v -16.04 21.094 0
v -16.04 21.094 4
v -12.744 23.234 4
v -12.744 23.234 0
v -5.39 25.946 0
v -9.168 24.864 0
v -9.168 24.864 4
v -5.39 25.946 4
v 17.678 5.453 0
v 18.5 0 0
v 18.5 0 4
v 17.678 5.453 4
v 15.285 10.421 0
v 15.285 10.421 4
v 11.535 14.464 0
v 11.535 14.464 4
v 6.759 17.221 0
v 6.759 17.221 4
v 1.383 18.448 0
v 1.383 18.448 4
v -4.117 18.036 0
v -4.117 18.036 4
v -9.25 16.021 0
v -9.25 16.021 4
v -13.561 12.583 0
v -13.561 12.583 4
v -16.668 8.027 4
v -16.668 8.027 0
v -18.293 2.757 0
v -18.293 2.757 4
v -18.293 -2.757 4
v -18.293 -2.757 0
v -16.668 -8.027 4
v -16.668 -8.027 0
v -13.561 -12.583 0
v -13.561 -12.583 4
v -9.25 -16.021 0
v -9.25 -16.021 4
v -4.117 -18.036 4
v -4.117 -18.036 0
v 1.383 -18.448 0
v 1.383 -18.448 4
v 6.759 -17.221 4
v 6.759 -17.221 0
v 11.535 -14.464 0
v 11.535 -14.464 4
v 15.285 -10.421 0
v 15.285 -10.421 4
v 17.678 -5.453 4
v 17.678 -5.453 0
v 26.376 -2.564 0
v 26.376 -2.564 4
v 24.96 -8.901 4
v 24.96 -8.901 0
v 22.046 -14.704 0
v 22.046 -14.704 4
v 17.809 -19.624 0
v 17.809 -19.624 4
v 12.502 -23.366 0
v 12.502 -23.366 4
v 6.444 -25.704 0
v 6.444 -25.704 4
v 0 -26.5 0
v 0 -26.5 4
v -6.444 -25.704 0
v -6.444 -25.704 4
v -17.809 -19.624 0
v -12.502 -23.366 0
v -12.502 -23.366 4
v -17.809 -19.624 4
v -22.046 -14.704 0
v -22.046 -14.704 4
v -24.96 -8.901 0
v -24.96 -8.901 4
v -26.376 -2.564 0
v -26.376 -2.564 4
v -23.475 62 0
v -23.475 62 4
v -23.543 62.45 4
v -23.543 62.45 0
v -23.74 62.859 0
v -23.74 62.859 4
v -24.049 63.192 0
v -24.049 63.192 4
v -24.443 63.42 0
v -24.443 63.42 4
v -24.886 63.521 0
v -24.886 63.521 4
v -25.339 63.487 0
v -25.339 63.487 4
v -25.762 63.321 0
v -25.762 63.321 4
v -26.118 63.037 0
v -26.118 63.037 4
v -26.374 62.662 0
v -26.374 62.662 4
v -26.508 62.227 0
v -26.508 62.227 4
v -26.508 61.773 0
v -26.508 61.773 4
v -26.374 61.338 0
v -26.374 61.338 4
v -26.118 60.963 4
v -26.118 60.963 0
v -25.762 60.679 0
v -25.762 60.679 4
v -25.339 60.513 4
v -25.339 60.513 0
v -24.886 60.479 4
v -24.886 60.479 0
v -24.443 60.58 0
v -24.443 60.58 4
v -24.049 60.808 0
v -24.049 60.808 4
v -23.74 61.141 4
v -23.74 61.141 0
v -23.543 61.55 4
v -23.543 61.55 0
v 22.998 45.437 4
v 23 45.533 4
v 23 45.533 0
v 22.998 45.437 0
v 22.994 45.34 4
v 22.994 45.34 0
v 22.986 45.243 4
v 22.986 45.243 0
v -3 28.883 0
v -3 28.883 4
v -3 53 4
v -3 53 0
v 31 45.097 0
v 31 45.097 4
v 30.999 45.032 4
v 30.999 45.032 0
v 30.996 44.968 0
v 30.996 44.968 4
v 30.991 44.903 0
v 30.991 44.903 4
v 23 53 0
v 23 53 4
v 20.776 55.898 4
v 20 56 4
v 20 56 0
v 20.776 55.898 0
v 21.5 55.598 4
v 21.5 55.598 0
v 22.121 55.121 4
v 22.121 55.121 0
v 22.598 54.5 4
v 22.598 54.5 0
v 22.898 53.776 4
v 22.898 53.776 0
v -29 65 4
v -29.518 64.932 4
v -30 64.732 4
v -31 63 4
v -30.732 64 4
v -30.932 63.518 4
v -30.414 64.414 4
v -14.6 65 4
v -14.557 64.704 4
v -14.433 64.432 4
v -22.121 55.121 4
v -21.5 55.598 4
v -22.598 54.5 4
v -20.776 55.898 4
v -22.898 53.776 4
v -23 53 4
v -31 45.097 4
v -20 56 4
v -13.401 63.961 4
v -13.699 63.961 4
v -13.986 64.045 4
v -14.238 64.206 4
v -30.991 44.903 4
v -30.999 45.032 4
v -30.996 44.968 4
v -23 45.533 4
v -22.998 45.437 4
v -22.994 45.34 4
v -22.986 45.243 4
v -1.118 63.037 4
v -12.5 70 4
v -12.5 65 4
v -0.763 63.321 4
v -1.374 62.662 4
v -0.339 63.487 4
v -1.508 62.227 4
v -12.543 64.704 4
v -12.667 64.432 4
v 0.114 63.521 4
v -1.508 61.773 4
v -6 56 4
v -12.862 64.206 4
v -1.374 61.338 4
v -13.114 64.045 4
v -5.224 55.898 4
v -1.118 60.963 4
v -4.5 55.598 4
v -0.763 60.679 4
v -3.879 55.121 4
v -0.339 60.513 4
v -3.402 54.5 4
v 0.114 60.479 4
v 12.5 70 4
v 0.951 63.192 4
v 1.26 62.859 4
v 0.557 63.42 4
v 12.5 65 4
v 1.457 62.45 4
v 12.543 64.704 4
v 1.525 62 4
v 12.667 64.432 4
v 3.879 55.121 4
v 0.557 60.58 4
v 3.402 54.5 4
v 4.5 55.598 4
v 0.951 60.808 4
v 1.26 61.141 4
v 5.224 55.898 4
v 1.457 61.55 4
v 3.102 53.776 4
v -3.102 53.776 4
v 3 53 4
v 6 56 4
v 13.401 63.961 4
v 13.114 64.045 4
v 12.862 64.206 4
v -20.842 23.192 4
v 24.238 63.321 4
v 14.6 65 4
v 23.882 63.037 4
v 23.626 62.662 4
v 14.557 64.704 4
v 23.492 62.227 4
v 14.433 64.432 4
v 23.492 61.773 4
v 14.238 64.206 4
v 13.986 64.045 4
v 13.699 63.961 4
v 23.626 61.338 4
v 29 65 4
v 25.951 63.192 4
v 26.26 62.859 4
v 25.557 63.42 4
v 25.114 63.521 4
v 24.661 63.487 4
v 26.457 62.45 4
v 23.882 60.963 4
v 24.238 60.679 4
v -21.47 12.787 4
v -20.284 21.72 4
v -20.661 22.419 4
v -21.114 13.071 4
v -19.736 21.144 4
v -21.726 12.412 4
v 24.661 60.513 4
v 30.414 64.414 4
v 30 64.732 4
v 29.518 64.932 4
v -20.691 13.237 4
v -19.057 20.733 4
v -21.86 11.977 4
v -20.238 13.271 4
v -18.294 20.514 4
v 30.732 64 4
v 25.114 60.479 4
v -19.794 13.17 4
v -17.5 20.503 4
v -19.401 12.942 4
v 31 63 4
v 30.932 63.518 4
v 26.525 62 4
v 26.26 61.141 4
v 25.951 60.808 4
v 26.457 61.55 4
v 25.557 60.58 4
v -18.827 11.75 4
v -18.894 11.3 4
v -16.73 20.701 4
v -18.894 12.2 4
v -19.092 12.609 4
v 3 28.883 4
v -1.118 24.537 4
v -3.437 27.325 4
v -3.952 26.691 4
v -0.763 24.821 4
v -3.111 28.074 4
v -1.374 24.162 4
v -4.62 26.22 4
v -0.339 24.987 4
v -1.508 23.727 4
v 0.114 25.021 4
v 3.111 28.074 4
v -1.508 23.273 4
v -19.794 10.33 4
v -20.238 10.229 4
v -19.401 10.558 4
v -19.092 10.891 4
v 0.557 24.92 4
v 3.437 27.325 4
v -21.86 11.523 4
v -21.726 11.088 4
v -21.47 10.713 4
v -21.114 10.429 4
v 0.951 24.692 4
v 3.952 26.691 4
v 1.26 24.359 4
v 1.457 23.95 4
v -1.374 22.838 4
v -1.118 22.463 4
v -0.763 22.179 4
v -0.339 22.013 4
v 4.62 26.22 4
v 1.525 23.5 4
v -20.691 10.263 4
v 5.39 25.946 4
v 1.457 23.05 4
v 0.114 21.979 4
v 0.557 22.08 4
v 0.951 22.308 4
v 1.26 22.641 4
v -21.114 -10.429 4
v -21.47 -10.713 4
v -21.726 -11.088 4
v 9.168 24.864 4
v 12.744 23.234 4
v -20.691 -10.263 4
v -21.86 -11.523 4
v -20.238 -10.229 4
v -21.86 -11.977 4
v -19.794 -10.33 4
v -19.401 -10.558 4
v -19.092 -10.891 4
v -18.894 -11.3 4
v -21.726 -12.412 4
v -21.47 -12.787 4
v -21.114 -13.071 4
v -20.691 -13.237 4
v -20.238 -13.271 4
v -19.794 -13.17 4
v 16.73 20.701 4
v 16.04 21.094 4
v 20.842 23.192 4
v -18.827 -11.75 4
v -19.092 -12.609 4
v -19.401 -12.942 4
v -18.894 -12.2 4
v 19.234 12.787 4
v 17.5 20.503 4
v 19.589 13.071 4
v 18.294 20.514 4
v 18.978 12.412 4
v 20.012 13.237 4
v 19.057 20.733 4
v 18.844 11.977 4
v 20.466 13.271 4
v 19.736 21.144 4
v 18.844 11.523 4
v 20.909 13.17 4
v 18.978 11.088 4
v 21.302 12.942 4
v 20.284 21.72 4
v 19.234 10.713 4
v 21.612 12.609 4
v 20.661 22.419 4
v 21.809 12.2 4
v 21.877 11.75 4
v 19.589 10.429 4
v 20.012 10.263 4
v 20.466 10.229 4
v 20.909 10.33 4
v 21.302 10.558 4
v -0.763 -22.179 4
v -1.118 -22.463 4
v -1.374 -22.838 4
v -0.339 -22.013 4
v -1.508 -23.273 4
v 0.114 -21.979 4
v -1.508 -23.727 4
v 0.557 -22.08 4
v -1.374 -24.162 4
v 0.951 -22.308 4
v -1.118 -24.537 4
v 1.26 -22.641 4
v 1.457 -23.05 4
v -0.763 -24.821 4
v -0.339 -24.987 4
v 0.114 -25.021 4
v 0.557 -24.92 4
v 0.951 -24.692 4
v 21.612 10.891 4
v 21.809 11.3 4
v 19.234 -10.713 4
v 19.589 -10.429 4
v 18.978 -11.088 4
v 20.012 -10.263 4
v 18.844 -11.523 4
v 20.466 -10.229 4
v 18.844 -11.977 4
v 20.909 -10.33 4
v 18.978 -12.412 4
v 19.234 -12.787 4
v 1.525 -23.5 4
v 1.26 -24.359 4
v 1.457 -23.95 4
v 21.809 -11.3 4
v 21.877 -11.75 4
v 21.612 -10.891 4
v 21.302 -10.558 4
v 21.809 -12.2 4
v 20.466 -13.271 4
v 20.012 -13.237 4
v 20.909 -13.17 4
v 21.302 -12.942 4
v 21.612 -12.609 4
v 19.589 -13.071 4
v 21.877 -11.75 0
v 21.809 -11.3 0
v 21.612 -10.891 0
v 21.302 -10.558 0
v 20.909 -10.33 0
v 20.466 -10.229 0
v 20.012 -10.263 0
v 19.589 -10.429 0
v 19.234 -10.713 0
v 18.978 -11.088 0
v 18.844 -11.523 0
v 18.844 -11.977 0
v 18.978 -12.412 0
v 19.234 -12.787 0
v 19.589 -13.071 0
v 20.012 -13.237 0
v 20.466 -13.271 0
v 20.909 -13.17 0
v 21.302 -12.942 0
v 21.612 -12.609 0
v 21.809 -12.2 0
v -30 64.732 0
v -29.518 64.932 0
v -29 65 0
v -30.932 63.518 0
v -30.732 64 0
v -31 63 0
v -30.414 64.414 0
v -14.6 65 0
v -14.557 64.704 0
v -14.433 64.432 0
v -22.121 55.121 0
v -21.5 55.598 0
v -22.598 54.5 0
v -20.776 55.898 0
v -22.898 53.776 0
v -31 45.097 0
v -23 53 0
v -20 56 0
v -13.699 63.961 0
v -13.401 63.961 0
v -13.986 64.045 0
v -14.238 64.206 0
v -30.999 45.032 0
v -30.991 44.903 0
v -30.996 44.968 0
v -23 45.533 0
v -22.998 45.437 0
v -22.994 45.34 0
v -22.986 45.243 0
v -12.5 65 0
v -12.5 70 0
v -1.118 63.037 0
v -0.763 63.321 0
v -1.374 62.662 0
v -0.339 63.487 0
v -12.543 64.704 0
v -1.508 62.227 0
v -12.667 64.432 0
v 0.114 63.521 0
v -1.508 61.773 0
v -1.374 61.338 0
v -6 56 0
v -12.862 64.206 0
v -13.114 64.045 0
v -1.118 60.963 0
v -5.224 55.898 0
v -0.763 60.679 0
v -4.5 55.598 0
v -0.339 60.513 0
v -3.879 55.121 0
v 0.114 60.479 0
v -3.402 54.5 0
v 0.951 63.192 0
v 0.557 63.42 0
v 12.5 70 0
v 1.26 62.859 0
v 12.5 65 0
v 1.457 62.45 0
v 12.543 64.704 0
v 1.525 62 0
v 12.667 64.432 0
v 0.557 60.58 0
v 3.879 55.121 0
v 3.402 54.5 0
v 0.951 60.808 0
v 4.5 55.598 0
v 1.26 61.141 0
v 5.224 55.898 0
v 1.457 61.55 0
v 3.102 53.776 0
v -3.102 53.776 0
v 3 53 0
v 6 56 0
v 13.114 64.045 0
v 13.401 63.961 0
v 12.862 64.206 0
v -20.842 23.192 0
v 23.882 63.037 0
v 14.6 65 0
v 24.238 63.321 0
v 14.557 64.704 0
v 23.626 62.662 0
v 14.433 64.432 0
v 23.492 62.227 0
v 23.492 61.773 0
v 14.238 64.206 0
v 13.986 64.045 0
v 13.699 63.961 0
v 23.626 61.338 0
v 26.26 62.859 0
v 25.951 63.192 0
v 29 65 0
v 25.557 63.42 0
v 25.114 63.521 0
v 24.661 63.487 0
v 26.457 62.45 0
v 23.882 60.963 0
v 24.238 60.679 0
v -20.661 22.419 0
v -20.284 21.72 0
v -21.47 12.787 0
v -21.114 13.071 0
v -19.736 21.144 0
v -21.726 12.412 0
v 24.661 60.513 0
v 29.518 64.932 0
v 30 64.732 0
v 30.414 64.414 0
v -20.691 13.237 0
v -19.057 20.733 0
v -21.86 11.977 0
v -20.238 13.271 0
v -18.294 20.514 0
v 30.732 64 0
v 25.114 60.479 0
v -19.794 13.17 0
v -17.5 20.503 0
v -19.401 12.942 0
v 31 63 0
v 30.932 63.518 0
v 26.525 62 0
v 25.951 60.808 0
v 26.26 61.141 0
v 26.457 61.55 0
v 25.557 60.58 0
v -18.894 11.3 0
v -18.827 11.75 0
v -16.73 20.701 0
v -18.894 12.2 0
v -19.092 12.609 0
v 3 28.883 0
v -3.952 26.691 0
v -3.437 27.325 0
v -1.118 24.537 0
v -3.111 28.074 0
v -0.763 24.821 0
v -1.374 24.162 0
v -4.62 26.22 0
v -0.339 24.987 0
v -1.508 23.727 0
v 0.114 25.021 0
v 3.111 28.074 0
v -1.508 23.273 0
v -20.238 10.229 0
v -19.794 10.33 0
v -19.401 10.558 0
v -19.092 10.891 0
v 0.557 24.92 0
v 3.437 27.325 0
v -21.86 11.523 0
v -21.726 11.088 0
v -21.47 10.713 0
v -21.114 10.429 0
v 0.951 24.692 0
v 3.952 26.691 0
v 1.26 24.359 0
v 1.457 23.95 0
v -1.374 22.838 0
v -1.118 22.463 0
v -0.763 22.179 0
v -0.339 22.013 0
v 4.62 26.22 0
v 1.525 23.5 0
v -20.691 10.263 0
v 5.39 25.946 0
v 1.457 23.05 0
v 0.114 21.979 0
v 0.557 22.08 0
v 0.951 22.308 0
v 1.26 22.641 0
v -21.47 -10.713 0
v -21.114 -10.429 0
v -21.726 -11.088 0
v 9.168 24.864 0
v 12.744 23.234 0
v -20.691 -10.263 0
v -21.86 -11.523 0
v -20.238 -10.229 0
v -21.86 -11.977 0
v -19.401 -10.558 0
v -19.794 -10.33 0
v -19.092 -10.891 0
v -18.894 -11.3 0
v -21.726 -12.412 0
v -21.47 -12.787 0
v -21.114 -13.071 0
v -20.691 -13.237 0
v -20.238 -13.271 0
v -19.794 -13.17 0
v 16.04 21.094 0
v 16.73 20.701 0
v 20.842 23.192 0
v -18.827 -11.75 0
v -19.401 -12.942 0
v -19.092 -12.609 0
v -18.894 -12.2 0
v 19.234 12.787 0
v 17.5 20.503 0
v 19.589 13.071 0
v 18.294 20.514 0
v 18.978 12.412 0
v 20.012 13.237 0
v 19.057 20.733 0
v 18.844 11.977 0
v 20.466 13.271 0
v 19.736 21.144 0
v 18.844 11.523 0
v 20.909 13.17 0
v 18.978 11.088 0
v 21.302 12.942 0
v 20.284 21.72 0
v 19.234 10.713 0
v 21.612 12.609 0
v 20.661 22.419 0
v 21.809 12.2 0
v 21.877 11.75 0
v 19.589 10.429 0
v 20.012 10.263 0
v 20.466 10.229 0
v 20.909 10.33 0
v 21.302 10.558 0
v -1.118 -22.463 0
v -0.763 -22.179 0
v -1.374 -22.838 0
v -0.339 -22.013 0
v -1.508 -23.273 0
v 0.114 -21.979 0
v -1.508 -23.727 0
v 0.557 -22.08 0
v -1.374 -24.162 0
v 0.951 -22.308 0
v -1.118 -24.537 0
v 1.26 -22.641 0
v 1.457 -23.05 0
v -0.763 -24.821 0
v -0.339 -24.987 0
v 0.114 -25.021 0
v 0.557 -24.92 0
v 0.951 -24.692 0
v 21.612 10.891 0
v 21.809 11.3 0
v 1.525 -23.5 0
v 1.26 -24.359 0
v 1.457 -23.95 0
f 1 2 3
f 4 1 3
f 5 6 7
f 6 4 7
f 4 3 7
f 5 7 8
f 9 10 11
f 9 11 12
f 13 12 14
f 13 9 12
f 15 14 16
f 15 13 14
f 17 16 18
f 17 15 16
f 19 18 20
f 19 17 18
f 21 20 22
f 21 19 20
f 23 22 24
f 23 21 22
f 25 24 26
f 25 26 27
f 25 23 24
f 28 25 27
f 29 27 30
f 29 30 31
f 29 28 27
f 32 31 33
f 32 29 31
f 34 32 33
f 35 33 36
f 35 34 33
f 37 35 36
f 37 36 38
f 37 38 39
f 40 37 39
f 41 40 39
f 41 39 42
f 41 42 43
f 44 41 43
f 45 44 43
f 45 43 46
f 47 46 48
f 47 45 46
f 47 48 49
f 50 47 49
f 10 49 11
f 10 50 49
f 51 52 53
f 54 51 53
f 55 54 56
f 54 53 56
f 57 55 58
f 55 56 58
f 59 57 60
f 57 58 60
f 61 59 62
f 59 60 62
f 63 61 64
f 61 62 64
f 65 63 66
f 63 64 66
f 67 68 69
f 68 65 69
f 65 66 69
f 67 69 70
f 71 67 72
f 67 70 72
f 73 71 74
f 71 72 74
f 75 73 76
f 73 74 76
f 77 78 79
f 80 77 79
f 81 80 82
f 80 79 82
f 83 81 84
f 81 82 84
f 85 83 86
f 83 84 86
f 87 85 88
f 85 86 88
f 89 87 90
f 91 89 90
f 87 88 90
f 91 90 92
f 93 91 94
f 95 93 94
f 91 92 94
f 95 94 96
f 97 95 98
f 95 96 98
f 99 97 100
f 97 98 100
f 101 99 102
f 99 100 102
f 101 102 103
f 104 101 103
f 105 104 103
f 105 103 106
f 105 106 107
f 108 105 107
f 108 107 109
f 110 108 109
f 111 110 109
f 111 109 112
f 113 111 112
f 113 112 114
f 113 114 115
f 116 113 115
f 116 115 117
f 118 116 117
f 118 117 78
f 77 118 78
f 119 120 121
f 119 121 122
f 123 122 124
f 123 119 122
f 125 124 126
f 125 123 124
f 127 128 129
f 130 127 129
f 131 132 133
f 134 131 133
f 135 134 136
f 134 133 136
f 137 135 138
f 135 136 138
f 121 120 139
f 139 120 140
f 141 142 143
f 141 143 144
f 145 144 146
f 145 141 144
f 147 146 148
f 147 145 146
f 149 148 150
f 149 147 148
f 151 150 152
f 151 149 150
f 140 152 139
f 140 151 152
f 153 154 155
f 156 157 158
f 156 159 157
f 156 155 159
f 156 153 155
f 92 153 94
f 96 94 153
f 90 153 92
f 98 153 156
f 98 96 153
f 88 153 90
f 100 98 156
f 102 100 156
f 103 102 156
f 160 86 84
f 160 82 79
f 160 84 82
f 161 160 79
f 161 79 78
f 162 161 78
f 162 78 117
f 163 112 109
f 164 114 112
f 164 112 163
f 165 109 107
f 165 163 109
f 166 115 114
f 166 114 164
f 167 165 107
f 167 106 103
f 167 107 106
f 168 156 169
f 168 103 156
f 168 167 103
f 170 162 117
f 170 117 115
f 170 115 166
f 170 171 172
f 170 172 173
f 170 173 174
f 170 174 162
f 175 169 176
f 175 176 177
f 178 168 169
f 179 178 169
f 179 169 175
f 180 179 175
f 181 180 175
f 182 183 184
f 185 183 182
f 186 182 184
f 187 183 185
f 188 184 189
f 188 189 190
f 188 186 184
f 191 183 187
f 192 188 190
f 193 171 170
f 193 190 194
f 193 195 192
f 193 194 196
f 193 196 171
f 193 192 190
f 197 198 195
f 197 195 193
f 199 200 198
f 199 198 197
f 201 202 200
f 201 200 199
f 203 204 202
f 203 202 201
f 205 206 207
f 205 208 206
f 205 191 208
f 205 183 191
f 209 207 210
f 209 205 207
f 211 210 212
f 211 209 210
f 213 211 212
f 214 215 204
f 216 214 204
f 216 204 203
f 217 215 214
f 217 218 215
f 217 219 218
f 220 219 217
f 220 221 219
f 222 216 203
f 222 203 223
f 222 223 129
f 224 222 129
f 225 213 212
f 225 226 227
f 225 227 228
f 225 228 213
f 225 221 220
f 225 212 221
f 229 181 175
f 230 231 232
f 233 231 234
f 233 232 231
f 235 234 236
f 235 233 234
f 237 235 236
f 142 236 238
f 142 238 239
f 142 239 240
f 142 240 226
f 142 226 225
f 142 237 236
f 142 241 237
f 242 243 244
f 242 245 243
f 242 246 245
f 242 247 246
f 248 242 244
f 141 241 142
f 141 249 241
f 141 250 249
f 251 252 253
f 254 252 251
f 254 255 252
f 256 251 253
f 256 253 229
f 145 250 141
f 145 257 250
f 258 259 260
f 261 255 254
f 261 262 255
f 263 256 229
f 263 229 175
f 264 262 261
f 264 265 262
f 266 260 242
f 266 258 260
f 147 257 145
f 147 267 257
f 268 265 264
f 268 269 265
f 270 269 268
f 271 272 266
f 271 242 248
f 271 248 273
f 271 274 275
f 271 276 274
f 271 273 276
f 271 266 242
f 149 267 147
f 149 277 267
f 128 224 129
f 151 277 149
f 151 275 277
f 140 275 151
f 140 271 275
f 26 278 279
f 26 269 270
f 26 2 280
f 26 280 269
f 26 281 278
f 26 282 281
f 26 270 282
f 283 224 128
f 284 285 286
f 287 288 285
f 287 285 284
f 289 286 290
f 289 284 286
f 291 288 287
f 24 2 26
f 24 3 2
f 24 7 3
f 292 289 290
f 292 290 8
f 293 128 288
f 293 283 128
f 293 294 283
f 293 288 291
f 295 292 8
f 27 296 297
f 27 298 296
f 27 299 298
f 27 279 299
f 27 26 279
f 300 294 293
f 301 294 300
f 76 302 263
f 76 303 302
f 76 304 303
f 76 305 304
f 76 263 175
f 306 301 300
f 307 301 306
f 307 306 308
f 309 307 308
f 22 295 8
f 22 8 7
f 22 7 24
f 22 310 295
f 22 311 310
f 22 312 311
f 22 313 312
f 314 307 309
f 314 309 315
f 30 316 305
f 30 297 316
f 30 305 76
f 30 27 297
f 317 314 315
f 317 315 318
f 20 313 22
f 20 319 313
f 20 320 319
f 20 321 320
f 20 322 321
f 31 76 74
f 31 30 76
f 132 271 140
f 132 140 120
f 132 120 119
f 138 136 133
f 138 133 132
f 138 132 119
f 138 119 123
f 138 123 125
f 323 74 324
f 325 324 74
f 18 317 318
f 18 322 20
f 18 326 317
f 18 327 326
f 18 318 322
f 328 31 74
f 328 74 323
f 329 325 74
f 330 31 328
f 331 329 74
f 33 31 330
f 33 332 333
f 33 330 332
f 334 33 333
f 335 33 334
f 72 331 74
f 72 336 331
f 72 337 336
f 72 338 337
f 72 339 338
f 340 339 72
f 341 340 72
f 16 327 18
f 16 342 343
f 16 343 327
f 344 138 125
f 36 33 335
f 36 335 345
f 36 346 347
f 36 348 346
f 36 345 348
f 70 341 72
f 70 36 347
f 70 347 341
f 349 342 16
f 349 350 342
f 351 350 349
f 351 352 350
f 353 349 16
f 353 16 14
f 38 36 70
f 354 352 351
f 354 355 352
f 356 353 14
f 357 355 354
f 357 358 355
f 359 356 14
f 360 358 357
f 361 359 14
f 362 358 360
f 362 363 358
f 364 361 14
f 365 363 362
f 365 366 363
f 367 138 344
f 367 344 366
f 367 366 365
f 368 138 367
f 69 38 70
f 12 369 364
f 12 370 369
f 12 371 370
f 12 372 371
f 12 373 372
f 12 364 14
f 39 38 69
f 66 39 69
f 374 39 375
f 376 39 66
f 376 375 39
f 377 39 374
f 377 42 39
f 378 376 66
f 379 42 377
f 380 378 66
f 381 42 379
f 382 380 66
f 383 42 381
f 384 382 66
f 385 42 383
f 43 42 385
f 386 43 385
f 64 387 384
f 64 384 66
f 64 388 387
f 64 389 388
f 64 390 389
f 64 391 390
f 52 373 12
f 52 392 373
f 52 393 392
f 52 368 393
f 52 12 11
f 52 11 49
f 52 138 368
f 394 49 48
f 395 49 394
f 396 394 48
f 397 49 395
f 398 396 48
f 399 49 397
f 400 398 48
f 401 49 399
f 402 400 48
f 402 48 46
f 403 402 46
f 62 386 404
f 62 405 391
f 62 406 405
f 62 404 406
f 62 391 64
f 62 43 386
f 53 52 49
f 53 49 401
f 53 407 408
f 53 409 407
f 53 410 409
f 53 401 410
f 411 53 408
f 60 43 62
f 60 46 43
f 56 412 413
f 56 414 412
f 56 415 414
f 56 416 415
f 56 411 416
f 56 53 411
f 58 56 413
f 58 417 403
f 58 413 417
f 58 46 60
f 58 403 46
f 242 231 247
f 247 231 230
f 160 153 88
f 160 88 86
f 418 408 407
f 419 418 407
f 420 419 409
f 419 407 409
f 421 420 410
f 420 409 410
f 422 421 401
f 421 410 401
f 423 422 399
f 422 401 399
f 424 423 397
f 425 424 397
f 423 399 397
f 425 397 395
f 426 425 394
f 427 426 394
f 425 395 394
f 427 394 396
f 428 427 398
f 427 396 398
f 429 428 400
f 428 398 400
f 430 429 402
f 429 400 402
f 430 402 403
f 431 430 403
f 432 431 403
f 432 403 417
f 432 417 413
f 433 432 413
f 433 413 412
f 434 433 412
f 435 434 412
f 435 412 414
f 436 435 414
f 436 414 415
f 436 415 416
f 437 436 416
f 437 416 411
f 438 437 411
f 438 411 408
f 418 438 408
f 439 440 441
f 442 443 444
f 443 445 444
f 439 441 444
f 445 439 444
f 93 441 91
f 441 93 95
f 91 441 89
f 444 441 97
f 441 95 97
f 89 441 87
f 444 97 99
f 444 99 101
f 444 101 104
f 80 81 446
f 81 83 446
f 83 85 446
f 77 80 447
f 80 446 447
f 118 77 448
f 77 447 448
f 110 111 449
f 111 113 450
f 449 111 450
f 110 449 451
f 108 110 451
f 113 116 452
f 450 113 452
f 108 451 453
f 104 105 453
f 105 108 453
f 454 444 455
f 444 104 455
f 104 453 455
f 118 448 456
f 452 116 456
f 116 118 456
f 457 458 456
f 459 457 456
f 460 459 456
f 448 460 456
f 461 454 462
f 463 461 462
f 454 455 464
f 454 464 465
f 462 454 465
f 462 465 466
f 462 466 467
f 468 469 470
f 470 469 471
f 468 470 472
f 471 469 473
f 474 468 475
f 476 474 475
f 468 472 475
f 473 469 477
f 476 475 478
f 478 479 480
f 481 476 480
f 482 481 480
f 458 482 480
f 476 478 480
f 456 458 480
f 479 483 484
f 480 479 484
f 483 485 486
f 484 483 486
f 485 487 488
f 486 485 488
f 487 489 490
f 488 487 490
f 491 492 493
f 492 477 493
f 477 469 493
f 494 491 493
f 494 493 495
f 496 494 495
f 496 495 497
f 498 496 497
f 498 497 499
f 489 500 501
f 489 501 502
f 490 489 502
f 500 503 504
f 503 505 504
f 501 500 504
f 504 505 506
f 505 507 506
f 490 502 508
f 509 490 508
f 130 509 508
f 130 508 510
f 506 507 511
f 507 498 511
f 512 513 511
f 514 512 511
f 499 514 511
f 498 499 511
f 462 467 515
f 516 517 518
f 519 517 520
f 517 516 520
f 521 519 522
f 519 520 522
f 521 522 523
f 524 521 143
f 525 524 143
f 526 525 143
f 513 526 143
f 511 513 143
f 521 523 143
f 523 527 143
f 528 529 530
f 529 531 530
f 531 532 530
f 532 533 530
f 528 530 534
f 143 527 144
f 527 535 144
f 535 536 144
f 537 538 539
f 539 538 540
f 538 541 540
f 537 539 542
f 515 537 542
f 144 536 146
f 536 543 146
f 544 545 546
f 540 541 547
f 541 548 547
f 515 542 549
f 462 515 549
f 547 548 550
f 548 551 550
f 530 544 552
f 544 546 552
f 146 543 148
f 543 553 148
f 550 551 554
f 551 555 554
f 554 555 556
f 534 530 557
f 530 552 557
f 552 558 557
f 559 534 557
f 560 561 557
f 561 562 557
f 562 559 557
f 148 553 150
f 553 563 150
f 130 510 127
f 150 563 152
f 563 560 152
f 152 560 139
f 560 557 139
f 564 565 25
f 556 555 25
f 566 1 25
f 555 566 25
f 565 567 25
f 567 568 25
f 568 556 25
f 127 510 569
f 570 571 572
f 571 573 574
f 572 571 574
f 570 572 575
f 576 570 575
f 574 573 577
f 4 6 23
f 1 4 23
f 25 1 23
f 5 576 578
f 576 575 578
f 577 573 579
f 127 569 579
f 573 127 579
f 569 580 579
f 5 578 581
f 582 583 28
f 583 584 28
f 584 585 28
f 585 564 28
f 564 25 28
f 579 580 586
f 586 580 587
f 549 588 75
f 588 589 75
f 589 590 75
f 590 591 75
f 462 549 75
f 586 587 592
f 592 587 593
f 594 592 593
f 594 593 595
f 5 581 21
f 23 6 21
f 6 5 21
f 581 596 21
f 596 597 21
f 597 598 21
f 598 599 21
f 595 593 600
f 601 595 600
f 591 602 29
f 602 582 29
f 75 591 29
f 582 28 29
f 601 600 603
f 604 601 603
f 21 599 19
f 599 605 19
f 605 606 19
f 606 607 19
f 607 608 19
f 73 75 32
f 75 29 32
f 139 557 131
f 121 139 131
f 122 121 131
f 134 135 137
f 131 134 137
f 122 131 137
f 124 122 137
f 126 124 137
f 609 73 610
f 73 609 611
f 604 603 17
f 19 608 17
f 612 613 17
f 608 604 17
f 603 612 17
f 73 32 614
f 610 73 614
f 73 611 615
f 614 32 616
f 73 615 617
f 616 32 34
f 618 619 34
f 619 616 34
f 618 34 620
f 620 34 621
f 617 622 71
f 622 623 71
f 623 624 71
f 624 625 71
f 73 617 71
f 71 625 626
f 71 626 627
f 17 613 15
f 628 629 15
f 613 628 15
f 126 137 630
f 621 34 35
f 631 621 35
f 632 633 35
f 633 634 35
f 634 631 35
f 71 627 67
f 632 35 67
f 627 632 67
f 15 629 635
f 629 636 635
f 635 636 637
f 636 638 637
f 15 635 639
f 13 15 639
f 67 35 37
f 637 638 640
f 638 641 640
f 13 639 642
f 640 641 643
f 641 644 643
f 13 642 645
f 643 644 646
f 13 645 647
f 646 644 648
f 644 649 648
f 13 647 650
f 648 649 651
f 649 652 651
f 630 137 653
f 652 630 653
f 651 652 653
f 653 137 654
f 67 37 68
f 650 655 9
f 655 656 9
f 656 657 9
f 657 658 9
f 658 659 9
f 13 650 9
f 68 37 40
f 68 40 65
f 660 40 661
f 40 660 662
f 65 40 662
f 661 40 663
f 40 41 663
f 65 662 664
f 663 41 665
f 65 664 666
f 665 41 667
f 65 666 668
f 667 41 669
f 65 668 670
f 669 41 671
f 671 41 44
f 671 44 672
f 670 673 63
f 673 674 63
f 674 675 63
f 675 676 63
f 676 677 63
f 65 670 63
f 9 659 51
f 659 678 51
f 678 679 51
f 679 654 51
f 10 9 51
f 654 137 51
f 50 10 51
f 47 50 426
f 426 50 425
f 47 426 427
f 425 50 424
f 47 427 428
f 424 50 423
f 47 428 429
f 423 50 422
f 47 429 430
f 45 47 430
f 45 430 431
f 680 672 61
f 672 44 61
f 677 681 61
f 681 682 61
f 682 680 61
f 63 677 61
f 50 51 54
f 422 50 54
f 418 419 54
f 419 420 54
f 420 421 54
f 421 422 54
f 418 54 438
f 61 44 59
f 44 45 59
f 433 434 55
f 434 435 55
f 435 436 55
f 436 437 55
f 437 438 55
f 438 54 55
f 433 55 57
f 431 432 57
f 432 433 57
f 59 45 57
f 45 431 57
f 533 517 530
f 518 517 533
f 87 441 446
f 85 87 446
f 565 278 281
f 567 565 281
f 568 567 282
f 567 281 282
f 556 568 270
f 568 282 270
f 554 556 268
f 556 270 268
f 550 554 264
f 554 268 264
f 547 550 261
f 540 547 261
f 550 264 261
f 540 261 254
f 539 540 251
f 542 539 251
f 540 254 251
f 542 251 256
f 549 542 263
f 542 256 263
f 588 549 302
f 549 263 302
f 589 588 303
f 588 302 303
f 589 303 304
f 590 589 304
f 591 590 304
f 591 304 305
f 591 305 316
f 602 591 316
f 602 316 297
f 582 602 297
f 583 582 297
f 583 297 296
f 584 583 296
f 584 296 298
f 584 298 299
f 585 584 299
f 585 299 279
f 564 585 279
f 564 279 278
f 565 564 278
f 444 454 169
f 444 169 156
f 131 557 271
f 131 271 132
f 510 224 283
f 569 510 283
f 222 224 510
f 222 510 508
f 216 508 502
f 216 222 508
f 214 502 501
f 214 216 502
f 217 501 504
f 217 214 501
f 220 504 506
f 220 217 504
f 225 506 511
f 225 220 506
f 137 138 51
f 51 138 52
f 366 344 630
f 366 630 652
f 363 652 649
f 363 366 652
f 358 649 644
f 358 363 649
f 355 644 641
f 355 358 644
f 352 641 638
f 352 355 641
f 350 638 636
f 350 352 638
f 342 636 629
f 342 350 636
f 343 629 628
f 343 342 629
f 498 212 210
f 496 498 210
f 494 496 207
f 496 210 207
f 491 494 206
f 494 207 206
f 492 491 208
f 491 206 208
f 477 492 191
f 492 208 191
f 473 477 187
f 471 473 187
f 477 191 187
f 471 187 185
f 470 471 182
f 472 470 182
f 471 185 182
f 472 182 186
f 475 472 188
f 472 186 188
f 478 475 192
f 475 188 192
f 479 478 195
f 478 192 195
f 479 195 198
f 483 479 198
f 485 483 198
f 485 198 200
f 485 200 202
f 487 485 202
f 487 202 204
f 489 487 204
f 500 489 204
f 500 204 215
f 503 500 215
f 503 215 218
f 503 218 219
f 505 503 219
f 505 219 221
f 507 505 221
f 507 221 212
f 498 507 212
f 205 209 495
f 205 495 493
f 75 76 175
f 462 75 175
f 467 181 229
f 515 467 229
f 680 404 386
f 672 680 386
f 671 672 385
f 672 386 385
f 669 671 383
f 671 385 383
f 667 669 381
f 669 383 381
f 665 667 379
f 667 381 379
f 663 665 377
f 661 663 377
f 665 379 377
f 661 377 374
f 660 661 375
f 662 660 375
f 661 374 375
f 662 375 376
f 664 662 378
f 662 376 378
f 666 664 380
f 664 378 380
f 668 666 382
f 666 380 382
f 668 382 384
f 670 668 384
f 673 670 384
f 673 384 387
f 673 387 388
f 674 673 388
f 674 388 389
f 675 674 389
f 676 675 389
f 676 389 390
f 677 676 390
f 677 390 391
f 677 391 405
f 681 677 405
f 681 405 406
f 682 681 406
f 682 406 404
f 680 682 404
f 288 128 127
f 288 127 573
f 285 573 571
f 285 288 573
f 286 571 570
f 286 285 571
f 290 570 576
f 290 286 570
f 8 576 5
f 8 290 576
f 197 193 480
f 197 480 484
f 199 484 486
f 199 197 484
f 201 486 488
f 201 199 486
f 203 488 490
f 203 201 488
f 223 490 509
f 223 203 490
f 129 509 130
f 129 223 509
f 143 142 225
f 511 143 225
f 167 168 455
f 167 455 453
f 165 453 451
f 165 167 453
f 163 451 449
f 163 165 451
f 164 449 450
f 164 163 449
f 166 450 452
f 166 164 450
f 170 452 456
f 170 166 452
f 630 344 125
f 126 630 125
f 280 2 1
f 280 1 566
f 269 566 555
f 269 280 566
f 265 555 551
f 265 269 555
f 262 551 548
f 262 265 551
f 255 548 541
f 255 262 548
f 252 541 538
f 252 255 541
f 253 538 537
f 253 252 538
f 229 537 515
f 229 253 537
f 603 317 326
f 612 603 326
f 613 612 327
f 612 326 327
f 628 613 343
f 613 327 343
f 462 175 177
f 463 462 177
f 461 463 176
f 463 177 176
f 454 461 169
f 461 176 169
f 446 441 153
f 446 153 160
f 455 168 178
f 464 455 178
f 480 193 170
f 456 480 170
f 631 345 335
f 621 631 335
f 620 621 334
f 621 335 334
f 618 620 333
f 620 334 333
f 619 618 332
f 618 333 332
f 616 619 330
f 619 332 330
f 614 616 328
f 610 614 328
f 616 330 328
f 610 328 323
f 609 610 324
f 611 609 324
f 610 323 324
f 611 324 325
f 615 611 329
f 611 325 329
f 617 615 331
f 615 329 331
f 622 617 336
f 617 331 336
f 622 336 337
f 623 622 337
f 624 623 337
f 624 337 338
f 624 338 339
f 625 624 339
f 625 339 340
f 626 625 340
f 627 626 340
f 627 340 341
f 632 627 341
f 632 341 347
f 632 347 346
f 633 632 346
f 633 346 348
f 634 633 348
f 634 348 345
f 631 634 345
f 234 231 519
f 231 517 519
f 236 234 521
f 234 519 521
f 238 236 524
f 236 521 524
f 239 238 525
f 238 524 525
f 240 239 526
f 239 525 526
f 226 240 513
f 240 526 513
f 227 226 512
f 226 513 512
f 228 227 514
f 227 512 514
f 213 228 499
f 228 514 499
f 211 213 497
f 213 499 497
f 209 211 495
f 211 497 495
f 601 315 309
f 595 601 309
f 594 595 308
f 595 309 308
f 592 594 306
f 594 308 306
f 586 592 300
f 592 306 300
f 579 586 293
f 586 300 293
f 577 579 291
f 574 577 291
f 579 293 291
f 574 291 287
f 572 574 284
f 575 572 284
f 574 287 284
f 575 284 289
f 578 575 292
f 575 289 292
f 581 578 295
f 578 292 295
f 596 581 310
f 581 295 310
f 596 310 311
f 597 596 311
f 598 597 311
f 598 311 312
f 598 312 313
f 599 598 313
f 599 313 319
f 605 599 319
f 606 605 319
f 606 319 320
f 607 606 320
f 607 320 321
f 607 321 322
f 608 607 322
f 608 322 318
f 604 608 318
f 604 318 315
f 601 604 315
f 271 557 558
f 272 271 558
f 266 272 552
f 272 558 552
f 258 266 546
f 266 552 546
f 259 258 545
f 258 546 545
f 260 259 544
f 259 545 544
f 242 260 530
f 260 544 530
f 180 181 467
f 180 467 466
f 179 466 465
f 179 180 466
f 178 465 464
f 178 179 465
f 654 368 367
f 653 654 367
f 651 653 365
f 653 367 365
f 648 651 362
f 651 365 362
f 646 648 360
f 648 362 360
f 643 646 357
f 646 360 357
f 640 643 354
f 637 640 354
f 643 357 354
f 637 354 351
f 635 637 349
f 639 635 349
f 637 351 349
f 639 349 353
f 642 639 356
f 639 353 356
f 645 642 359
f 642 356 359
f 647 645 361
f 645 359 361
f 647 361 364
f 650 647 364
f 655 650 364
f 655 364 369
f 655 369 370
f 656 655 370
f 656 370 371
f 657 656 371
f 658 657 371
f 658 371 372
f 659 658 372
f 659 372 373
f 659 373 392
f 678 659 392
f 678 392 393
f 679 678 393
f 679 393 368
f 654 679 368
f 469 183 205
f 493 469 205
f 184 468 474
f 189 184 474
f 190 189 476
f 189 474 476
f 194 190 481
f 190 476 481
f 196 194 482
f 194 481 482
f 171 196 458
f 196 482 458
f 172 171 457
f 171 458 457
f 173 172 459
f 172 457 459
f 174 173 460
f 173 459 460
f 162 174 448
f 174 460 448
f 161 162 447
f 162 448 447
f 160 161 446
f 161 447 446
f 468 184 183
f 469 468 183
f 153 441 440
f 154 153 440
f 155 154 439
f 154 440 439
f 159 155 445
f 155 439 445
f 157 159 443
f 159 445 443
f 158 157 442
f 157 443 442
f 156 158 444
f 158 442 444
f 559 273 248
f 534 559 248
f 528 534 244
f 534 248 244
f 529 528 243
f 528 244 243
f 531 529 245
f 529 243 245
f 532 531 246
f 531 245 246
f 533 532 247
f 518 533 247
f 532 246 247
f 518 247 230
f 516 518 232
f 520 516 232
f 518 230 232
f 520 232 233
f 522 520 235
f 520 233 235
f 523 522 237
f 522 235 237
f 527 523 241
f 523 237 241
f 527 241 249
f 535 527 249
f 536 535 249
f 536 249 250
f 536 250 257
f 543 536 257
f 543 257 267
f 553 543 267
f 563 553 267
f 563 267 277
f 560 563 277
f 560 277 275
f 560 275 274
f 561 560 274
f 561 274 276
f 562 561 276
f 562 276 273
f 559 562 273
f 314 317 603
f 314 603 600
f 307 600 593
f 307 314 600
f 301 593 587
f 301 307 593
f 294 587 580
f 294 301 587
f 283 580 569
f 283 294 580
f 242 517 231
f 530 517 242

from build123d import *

# Parameters (mm, degrees)
SKETCH_1_R          = 18.5
EXTRUDE_1_DEPTH     = 4
CUT_EXTRUDE_1_DEPTH = 10
SKETCH_3_R          = 1.525
CUT_EXTRUDE_2_DEPTH = 22
SKETCH_4_R          = 1.525
CUT_EXTRUDE_3_DEPTH = 22
FILLET_1_R          = 2
SKETCH_5_W          = 25
SKETCH_5_H          = 5
EXTRUDE_2_DEPTH     = 4
SKETCH_6_R          = 1.05
CUT_EXTRUDE_4_DEPTH = 4
CUT_EXTRUDE_5_DEPTH = 52
FILLET_3_R          = 3


with BuildPart() as part:
    # 草图1 → 凸台-拉伸1 (new body)
    with BuildSketch(Plane.XY):
        with BuildLine():
            Line((-31, 0), (-31, 65))
            Line((-31, 65), (31, 65))
            Line((31, 65), (31, 0))
            ThreePointArc((31, 0), (0, -31), (-31, 0))
        make_face()
        Circle(SKETCH_1_R, mode=Mode.SUBTRACT)
    extrude(amount=EXTRUDE_1_DEPTH)

    # 草图2 → 切除-拉伸1 (cut)
    with BuildSketch(Plane.XY.offset(4)):
        with BuildLine():
            Line((-26.375636933, -2.564327665), (-31, 45))
            Line((-31, 45), (-31, -32))
            Line((-31, -32), (31, -32))
            Line((31, -32), (31, 45))
            Line((31, 45), (26.375636933, -2.564327665))
            ThreePointArc((26.375636933, -2.564327665), (0, -26.5), (-26.375636933, -2.564327665))
        make_face()
    extrude(amount=-CUT_EXTRUDE_1_DEPTH, mode=Mode.SUBTRACT)

    # 草图3 → 切除-拉伸2 (cut)
    with BuildSketch(Plane.XY.offset(4)):
        with Locations((0, 23.5)):
            Circle(SKETCH_3_R)
        with Locations((20.351596989, 11.75)):
            Circle(SKETCH_3_R)
        with Locations((20.351596989, -11.75)):
            Circle(SKETCH_3_R)
        with Locations((0, -23.5)):
            Circle(SKETCH_3_R)
        with Locations((-20.351596989, -11.75)):
            Circle(SKETCH_3_R)
        with Locations((-20.351596989, 11.75)):
            Circle(SKETCH_3_R)
    extrude(amount=-CUT_EXTRUDE_2_DEPTH, mode=Mode.SUBTRACT)

    # 草图4 → 切除-拉伸3 (cut)
    with BuildSketch(Plane.XY.offset(4)):
        with Locations((25, 62)):
            Circle(SKETCH_4_R)
        with Locations((0, 62)):
            Circle(SKETCH_4_R)
        with Locations((-25, 62)):
            Circle(SKETCH_4_R)
    extrude(amount=-CUT_EXTRUDE_3_DEPTH, mode=Mode.SUBTRACT)

    # 圆角1
    # the kernel refuses this fillet: 2 mm, written as the material it takes off along each edge
    with BuildSketch(Plane(origin=(-31, 45, 4.242486693), x_dir=(0, 1, 0), z_dir=(0, 0, -1)), Plane(origin=(31, 45, 4.242486693), x_dir=(-0.09676708169889991, -0.9953070540790306, 0), z_dir=(0, 0, -1))) as fillet_1_piece_1:
        with BuildLine():
            CenterArc((FILLET_1_R * 0.048497338543, FILLET_1_R), FILLET_1_R, 264.446965205, 5.553034795)
            Line((-FILLET_1_R * 0.0482697431559, FILLET_1_R * 0.00469294592097), (0, 0))
            Line((0, 0), (FILLET_1_R * 0.048497338543, 0))
        make_face()
    extrude(amount=4.484973385, mode=Mode.SUBTRACT)
    with BuildSketch(Plane(origin=(-31, 65, -5), x_dir=(0, -1, 0), z_dir=(0, 0, 1)), Plane(origin=(31, 65, -5), x_dir=(-1, 0, 0), z_dir=(0, 0, 1))) as fillet_1_piece_2:
        with BuildLine():
            CenterArc((FILLET_1_R, FILLET_1_R), FILLET_1_R, 180, 90)
            Line((0, FILLET_1_R), (0, 0))
            Line((0, 0), (FILLET_1_R, 0))
        make_face()
    extrude(amount=14, mode=Mode.SUBTRACT)

    # 草图5 → 凸台-拉伸2 (add)
    with BuildSketch(Plane.XY.offset(4)):
        with Locations((0, 67.5)):
            Rectangle(SKETCH_5_W, SKETCH_5_H)
    extrude(amount=-EXTRUDE_2_DEPTH)

    # 草图6 → 切除-拉伸4 (cut)
    with BuildSketch(Plane(origin=(0, 0, 0), x_dir=(-1, 0, 0), z_dir=(0, 0, -1))):
        with Locations((13.55, 65)):
            Circle(SKETCH_6_R)
        with Locations((-13.55, 65)):
            Circle(SKETCH_6_R)
    extrude(amount=-CUT_EXTRUDE_4_DEPTH, mode=Mode.SUBTRACT)

    # 草图7 → 切除-拉伸5 (cut)
    with BuildSketch(Plane.XY.offset(4)):
        with BuildLine():
            Line((-3, 26.329641091), (-3, 56))
            Line((-3, 56), (-23, 56))
            Line((-23, 56), (-23, 45.387978708))
            Line((-23, 45.387978708), (-20.249206785, 17.094432561))
            ThreePointArc((-20.249206785, 17.094432561), (-12.508144274, 23.362284281), (-3, 26.329641091))
        make_face()
        with BuildLine():
            Line((3, 56), (3, 26.329641091))
            ThreePointArc((3, 26.329641091), (12.508144274, 23.362284281), (20.249206785, 17.094432561))
            Line((20.249206785, 17.094432561), (23, 45.387978708))
            Line((23, 45.387978708), (23, 56))
            Line((23, 56), (3, 56))
        make_face()
    extrude(amount=-CUT_EXTRUDE_5_DEPTH, mode=Mode.SUBTRACT)

    # 圆角3
    # the kernel refuses this fillet: 3 mm, written as the material it adds along each edge
    with BuildSketch(Plane(origin=(-3, 26.329641091, 4), x_dir=(0, 1, 0), z_dir=(0, 0, -1))) as fillet_3_piece_1:
        with BuildLine():
            CenterArc((2.553745137, -3), FILLET_3_R, 90, 78.264742526)
            ThreePointArc((-0.383548378, -2.389830508), (-0.164475151, -1.199296528), (0, 0))
            Line((0, 0), (2.553745137, 0))
        make_face()
    extrude(amount=4)
    with BuildSketch(Plane(origin=(-20.249206785, 17.094432561, 4), x_dir=(0.7249016624604615, 0.6888523642712269, 0), z_dir=(0, 0, -1))) as fillet_3_piece_2:
        with BuildLine():
            CenterArc((6.134944493, -2.981943006), FILLET_3_R, 96.289524431, 121.69677285)
            Line((3.770470579, -4.828362003), (0, 0))
            ThreePointArc((0, 0), (2.903143376, -0.159503449), (5.806286752, 0))
        make_face()
    extrude(amount=4)
    with BuildSketch(Plane(origin=(-23, 45.387978708, 4), x_dir=(0.09676708169889287, -0.9953070540790314, 0), z_dir=(0, 0, -1)), Plane(origin=(23, 45.387978708, 4), x_dir=(0, 1, 0), z_dir=(0, 0, -1))) as fillet_3_piece_3:
        with BuildLine():
            CenterArc((FILLET_3_R * 0.048497338543, -FILLET_3_R), FILLET_3_R, 90, 5.553034795)
            Line((-FILLET_3_R * 0.0482697431559, -FILLET_3_R * 0.00469294592097), (0, 0))
            Line((0, 0), (FILLET_3_R * 0.048497338543, 0))
        make_face()
    extrude(amount=4)
    with BuildSketch(Plane(origin=(-23, 56, 4), x_dir=(0, -1, 0), z_dir=(0, 0, -1)), Plane(origin=(3, 56, 4), x_dir=(0, -1, 0), z_dir=(0, 0, -1)), Plane(origin=(23, 56, 4), x_dir=(-1, 0, 0), z_dir=(0, 0, -1))) as fillet_3_piece_4:
        with BuildLine():
            CenterArc((FILLET_3_R, -FILLET_3_R), FILLET_3_R, 90, 90)
            Line((0, -FILLET_3_R), (0, 0))
            Line((0, 0), (FILLET_3_R, 0))
        make_face()
    extrude(amount=4)
    with BuildSketch(Plane(origin=(-3, 56, 4), x_dir=(0, -1, 0), z_dir=(0, 0, -1))) as fillet_3_piece_5:
        with BuildLine():
            CenterArc((FILLET_3_R, FILLET_3_R), FILLET_3_R, 180, 90)
            Line((0, FILLET_3_R), (0, 0))
            Line((0, 0), (FILLET_3_R, 0))
        make_face()
    extrude(amount=4)
    with BuildSketch(Plane(origin=(20.249206785, 17.094432561, 4), x_dir=(0.09676708169888887, 0.9953070540790317, 0), z_dir=(0, 0, -1))) as fillet_3_piece_6:
        with BuildLine():
            CenterArc((6.126134835, -3), FILLET_3_R, 90, 121.69677285)
            ThreePointArc((3.57361272, -4.576271186), (1.912520275, -2.189965527), (0, 0))
            Line((0, 0), (6.126134835, 0))
        make_face()
    extrude(amount=4)
    with BuildSketch(Plane(origin=(3, 26.329641091, 4), x_dir=(0, 1, 0), z_dir=(0, 0, -1))) as fillet_3_piece_7:
        with BuildLine():
            CenterArc((2.553745137, 3), FILLET_3_R, 191.735257474, 78.264742526)
            ThreePointArc((-0.383548378, 2.389830508), (-0.164475151, 1.199296528), (0, 0))
            Line((0, 0), (2.553745137, 0))
        make_face()
    extrude(amount=4)


solid = part.part
